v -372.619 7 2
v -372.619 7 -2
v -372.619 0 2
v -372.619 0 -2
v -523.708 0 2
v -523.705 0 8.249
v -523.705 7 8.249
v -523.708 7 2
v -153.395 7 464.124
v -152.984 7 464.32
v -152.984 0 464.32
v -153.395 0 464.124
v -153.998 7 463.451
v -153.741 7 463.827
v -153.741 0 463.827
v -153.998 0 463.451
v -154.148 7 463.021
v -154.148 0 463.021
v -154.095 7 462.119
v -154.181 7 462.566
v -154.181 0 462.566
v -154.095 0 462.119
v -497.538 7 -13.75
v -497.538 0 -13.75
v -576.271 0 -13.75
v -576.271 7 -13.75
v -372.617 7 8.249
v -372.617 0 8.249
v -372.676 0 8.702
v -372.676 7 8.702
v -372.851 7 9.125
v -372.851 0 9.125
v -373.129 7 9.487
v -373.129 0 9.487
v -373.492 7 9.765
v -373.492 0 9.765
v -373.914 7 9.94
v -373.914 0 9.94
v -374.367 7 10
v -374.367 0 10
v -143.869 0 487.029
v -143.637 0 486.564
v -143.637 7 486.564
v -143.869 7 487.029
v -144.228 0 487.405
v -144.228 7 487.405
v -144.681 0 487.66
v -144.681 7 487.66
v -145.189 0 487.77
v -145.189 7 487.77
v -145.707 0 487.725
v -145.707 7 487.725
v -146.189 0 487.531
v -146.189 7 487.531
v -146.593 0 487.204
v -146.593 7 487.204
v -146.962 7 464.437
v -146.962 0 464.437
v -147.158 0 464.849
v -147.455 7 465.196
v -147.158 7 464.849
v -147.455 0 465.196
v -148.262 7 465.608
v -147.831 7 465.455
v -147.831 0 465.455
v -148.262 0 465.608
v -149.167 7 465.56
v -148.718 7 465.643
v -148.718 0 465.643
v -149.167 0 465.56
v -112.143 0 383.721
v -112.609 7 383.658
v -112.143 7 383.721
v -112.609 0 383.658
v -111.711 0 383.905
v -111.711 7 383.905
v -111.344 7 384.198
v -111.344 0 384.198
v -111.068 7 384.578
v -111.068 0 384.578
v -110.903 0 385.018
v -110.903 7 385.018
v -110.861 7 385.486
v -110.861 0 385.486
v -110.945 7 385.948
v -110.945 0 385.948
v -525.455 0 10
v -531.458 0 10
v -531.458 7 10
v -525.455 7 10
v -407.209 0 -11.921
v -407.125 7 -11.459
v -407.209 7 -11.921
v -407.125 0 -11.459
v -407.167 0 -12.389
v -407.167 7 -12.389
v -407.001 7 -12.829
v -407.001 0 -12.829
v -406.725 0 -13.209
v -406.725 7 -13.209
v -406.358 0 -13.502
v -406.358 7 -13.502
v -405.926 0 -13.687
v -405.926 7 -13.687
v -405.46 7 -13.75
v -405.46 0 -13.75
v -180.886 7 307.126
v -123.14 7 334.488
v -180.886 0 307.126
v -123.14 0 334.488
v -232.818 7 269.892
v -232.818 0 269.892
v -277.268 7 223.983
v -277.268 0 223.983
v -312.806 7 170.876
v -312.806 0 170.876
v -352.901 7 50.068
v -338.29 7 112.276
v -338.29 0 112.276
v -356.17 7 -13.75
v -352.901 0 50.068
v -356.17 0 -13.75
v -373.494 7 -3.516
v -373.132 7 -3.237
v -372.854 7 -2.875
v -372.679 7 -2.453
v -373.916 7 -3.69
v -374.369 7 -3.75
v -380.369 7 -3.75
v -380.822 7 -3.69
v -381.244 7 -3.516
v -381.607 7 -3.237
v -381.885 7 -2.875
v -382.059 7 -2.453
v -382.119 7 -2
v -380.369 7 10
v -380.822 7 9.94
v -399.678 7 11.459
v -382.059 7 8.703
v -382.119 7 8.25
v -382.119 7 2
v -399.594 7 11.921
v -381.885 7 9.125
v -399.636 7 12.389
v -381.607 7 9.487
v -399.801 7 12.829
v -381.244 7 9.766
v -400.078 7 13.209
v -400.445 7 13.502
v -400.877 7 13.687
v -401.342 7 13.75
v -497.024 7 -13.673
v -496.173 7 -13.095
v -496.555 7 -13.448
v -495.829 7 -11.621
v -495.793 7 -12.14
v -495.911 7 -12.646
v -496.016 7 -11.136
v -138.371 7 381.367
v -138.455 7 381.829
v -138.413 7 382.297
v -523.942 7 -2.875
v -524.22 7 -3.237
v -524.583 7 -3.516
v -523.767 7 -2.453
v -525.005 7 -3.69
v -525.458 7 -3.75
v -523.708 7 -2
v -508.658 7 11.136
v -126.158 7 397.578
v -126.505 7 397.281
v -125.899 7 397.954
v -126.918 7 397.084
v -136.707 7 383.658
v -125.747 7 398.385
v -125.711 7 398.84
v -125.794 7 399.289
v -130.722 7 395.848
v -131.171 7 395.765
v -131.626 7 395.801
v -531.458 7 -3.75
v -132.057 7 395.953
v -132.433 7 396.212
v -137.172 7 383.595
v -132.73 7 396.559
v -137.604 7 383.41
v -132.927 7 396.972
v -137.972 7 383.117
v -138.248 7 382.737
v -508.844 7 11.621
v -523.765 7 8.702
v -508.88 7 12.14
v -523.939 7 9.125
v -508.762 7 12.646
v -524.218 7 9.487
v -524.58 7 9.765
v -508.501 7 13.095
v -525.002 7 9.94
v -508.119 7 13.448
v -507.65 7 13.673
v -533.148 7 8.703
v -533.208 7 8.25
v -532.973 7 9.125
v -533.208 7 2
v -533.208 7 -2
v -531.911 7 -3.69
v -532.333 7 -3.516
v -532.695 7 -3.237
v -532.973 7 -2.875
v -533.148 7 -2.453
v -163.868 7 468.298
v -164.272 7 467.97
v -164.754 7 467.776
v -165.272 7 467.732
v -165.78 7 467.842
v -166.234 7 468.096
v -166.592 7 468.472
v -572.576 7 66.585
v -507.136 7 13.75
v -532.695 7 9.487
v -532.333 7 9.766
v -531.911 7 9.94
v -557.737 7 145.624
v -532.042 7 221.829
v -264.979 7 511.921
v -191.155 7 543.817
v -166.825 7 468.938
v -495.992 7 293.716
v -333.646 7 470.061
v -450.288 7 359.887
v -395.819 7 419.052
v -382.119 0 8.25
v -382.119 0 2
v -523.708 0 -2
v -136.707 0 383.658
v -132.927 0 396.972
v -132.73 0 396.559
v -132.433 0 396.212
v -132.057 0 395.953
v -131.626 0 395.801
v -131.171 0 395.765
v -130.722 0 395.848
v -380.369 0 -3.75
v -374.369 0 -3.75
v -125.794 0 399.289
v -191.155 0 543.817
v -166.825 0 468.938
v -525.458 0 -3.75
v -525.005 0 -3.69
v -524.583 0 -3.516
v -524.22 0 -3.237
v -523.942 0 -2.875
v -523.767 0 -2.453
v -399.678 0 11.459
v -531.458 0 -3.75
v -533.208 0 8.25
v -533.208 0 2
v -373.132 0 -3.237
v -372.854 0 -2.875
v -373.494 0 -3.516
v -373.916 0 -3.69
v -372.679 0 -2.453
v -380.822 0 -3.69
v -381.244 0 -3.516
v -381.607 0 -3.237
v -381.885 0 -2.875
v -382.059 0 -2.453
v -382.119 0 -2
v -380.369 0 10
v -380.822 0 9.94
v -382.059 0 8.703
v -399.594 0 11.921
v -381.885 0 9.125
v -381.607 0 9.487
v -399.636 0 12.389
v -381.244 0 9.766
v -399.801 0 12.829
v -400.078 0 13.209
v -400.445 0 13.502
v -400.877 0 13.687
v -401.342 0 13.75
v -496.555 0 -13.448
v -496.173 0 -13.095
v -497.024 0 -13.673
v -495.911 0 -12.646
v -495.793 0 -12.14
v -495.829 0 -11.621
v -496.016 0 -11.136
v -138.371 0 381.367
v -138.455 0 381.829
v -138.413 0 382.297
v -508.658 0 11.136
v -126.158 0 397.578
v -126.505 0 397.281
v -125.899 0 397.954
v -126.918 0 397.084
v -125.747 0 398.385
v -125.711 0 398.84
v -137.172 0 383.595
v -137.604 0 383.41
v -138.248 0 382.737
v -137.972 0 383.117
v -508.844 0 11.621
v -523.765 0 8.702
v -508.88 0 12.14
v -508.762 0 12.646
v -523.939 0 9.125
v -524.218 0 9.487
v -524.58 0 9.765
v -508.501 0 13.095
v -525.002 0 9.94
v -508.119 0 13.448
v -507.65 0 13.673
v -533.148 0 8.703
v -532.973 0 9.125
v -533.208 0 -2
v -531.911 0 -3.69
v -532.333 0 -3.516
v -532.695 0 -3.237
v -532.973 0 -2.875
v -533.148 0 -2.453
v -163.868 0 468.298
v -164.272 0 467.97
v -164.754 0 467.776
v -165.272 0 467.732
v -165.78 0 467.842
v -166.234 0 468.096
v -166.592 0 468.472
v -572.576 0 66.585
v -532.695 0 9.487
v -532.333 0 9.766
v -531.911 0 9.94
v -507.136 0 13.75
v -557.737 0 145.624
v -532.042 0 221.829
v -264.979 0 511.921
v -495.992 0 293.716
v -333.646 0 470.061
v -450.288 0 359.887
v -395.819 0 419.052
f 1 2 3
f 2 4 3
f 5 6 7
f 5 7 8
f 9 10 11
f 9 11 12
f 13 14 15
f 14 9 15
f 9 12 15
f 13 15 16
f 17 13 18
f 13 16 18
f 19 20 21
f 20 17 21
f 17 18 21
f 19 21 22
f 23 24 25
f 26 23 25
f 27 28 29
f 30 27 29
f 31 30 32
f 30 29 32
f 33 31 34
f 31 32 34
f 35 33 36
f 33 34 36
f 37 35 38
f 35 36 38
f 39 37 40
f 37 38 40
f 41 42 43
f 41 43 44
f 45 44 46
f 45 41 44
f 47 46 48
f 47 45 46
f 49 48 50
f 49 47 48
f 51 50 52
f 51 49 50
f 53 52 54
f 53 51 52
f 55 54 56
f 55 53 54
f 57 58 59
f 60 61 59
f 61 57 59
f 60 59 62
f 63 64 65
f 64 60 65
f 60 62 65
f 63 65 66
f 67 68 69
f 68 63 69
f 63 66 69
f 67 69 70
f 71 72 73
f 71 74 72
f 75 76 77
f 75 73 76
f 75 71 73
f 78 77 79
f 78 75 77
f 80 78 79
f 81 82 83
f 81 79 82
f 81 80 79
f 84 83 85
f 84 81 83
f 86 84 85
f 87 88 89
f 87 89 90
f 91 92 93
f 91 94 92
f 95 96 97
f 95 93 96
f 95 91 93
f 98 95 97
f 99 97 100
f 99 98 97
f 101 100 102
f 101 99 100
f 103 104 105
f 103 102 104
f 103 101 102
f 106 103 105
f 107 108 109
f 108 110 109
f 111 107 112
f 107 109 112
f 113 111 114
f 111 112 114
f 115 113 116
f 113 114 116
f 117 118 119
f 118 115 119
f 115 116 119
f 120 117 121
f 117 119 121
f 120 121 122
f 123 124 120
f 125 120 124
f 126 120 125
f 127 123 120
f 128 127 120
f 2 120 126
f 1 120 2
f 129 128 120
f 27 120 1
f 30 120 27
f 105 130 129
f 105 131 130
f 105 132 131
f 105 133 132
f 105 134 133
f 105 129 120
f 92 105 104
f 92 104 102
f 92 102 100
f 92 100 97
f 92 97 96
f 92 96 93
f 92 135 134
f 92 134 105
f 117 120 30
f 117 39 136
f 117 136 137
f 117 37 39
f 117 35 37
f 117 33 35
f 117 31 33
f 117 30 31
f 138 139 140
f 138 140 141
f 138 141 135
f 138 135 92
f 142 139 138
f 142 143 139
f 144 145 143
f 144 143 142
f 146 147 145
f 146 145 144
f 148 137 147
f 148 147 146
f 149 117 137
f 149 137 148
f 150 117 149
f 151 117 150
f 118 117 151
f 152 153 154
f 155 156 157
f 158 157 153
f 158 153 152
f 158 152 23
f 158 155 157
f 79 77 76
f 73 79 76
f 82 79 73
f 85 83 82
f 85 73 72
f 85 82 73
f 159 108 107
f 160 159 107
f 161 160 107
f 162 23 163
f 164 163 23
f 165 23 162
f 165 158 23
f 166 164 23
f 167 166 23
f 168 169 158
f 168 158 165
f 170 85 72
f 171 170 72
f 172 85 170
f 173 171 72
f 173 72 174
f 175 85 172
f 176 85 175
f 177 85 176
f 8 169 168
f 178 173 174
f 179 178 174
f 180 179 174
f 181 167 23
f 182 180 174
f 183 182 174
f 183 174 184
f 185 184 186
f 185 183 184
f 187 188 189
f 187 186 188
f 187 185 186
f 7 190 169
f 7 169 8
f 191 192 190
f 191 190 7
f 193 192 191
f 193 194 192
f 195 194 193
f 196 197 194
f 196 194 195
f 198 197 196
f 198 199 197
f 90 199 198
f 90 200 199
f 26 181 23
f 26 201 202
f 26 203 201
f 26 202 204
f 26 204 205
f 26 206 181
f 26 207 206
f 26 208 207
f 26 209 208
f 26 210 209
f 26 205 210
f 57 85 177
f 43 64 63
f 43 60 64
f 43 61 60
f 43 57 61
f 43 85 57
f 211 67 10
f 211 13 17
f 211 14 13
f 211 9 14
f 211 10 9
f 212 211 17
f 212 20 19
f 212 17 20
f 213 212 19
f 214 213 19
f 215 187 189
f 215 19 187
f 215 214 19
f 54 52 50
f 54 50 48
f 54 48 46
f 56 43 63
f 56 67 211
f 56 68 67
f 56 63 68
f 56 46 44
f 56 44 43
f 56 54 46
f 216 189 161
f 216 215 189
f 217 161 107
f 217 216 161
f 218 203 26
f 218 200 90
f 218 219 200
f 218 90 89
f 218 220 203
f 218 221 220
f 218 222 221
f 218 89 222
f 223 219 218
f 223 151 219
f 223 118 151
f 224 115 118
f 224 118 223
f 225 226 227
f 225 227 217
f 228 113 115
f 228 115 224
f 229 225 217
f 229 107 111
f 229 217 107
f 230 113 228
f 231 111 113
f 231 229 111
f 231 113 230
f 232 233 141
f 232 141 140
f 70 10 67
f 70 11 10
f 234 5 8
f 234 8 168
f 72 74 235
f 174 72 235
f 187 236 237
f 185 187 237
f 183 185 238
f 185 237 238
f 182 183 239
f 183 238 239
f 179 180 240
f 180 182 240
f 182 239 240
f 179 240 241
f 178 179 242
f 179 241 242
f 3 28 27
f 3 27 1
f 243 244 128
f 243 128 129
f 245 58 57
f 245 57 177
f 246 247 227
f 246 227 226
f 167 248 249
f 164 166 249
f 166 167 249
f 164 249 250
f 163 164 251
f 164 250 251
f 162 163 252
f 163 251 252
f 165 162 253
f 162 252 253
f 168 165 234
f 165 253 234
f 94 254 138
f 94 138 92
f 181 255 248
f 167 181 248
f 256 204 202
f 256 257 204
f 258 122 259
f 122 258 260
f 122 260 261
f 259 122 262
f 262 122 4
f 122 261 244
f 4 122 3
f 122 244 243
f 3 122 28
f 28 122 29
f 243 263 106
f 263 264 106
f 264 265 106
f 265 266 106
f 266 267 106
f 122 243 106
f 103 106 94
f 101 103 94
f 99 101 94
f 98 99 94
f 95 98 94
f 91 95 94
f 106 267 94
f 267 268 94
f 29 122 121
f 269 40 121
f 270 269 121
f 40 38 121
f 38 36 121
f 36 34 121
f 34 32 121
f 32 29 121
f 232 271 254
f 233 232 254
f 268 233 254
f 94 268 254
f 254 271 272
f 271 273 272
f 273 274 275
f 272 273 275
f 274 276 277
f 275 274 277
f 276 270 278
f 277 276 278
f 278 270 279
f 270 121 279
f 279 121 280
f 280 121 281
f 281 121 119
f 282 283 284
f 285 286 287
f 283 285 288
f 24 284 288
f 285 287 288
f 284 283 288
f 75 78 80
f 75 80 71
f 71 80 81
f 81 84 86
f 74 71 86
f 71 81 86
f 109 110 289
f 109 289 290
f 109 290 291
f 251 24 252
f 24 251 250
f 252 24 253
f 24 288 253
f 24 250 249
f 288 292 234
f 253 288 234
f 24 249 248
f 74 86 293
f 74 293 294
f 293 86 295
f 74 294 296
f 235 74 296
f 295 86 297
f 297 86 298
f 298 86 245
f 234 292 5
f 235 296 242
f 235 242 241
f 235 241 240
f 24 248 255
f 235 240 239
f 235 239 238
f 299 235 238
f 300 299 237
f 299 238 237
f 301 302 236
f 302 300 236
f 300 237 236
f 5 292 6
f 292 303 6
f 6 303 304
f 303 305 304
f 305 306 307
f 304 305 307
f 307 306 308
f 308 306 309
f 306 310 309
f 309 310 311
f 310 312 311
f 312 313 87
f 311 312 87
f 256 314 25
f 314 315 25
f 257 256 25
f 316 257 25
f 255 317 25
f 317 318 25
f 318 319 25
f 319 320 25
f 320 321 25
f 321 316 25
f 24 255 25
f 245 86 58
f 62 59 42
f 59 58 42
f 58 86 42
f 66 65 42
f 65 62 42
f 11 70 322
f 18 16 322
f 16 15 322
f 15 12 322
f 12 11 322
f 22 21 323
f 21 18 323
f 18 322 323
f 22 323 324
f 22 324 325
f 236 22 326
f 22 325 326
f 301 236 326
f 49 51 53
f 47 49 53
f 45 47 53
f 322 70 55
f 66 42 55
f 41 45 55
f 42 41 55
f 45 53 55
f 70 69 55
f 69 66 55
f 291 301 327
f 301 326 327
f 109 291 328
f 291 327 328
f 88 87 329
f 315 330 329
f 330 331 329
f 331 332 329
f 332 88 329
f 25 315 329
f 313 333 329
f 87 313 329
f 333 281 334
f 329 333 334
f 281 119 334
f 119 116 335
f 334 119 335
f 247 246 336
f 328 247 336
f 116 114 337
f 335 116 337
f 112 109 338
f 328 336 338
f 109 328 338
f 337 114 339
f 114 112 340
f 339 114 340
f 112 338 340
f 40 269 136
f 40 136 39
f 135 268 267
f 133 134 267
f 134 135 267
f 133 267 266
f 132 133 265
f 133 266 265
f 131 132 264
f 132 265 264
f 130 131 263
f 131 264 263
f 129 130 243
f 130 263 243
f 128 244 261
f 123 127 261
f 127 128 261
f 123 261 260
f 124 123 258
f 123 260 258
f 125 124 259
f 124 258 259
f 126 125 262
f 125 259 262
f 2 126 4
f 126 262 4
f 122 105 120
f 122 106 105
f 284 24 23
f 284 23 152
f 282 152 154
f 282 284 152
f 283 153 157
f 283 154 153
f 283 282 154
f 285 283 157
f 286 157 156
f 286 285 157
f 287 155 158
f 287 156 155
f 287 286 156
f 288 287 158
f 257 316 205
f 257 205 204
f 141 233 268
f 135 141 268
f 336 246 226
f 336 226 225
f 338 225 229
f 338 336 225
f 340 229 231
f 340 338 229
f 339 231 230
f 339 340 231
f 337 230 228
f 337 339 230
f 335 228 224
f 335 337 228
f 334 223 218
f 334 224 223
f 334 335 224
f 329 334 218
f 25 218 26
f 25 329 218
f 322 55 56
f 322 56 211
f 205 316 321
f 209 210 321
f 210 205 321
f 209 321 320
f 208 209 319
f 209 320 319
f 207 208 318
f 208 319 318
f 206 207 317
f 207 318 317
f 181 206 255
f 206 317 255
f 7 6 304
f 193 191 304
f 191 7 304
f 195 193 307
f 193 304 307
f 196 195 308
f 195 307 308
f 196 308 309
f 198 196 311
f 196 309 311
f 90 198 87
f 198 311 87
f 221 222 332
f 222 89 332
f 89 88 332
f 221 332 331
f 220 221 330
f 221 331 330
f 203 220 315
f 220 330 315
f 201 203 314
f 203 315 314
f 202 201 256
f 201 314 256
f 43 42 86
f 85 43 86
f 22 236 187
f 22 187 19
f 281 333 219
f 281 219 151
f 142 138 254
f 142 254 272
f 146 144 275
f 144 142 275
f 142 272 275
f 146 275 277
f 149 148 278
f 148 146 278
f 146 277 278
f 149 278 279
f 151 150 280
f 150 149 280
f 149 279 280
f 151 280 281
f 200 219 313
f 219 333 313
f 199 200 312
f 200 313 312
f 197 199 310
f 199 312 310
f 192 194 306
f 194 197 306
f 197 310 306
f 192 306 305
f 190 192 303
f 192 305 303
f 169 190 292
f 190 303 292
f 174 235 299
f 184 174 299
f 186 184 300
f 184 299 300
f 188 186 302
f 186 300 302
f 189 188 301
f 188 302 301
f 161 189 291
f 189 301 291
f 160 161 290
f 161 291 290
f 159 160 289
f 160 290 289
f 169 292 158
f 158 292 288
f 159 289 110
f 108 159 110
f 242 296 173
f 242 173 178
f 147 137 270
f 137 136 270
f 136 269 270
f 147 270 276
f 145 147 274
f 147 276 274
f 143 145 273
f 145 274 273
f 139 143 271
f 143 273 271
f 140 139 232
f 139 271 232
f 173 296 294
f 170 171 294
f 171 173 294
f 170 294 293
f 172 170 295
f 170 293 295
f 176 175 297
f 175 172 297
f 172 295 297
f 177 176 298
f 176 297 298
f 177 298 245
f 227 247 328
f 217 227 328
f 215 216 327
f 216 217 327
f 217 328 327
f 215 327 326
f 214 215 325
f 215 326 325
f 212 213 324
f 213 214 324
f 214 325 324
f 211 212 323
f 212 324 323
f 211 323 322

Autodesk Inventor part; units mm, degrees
ref_plane "YZ Plane" through (0, 0, 0) normal (1, 0, 0) x (0, 1, 0)
ref_plane "XZ Plane" through (0, 0, 0) normal (0, 1, 0) x (-1, 0, 0)
ref_plane "XY Plane" through (0, 0, 0) normal (0, 0, 1) x (1, 0, 0)
sketch "Sketch1" plane through (0, 0, 0) normal (0, 1, 0) x (-1, 0, 0)
  line L0 (-545.8153, 185.3726) -> (-326.5965, 142.7608)
  line L1 (-545.8153, -185.3726) -> (-326.5965, -142.7608)
  arc A0 (-545.8153, -185.3726) -> (-545.8153, 185.3726) centre (0, 0) ccw
  arc A1 (374.3691, 3.75) -> (372.6191, 2) centre (374.3691, 2) ccw
  arc A2 (372.6191, -2) -> (374.3691, -3.75) centre (374.3691, -2) ccw
  line L2 (380.3691, 3.75) -> (374.3691, 3.75)
  line L3 (374.3691, -3.75) -> (380.3691, -3.75)
  line L4 (382.1191, 2) -> (382.1191, -2)
  arc A3 (380.3691, -3.75) -> (382.1191, -2) centre (380.3691, -2) ccw
  arc A4 (382.1191, 2) -> (380.3691, 3.75) centre (380.3691, 2) ccw
  line L5 (372.6191, -2) -> (372.6191, 2)
  line L6 (523.7076, 2) -> (523.7076, -2)
  arc A5 (523.7076, -2) -> (525.4576, -3.75) centre (525.4576, -2) ccw
  arc A6 (525.4576, 3.75) -> (523.7076, 2) centre (525.4576, 2) ccw
  line L7 (531.4576, -3.75) -> (525.4576, -3.75)
  line L8 (525.4576, 3.75) -> (531.4576, 3.75)
  arc A7 (531.4576, -3.75) -> (533.2076, -2) centre (531.4576, -2) ccw
  line L9 (533.2076, -2) -> (533.2076, 2)
  arc A8 (533.2076, 2) -> (531.4576, 3.75) centre (531.4576, 2) ccw
  arc A9 (-326.5965, -142.7608) -> (-326.5965, 142.7608) centre (0, 0) ccw
  line L10 (116.1792, 364.0349) -> (119.9834, 362.7989)
  arc A10 (121.107, 360.5937) -> (119.9834, 362.7989) centre (119.4426, 361.1345) ccw
  arc A11 (116.1792, 364.0349) -> (113.9741, 362.9114) centre (115.6384, 362.3706) ccw
  line L11 (119.2529, 354.8874) -> (121.107, 360.5937)
  line L12 (113.9741, 362.9114) -> (112.12, 357.205)
  line L13 (117.0478, 353.7638) -> (113.2435, 354.9999)
  arc A12 (112.12, 357.205) -> (113.2435, 354.9999) centre (113.7843, 356.6642) ccw
  arc A13 (117.0478, 353.7638) -> (119.2529, 354.8874) centre (117.5885, 355.4282) ccw
  arc A14 (163.7367, 497.4575) -> (165.9418, 498.5811) centre (164.2774, 499.1218) ccw
  arc A15 (158.8089, 500.8987) -> (159.9324, 498.6936) centre (160.4732, 500.3579) ccw
  line L14 (159.9324, 498.6936) -> (163.7367, 497.4575)
  line L15 (158.8089, 500.8987) -> (160.663, 506.605)
  line L16 (167.7959, 504.2874) -> (165.9418, 498.5811)
  arc A16 (162.8681, 507.7286) -> (160.663, 506.605) centre (162.3273, 506.0642) ccw
  line L17 (166.6723, 506.4925) -> (162.8681, 507.7286)
  arc A17 (167.7959, 504.2874) -> (166.6723, 506.4925) centre (166.1315, 504.8282) ccw
  line L18 (-310.3164, 222.986) -> (-307.9653, 226.222)
  arc A18 (-305.5209, 226.6092) -> (-307.9653, 226.222) centre (-306.5495, 225.1934) ccw
  arc A19 (-310.3164, 222.986) -> (-309.9293, 220.5416) centre (-308.9007, 221.9573) ccw
  line L19 (-300.6668, 223.0825) -> (-305.5209, 226.6092)
  line L20 (-309.9293, 220.5416) -> (-305.0752, 217.0148)
  line L21 (-300.2796, 220.6381) -> (-302.6308, 217.402)
  arc A20 (-305.0752, 217.0148) -> (-302.6308, 217.402) centre (-304.0466, 218.4306) ccw
  arc A21 (-300.2796, 220.6381) -> (-300.6668, 223.0825) centre (-301.6954, 221.6667) ccw
  arc A22 (-422.5128, 309.4456) -> (-422.8999, 311.89) centre (-423.9286, 310.4743) ccw
  arc A23 (-427.3083, 305.8224) -> (-424.8639, 306.2096) centre (-426.2797, 307.2382) ccw
  line L22 (-424.8639, 306.2096) -> (-422.5128, 309.4456)
  line L23 (-427.3083, 305.8224) -> (-432.1624, 309.3491)
  line L24 (-427.754, 315.4167) -> (-422.8999, 311.89)
  arc A24 (-432.5496, 311.7935) -> (-432.1624, 309.3491) centre (-431.1338, 310.7649) ccw
  line L25 (-430.1984, 315.0296) -> (-432.5496, 311.7935)
  arc A25 (-427.754, 315.4167) -> (-430.1984, 315.0296) centre (-428.7827, 314.001) ccw
  line L26 (-307.9653, -226.222) -> (-310.3164, -222.986)
  arc A26 (-309.9293, -220.5416) -> (-310.3164, -222.986) centre (-308.9007, -221.9573) ccw
  arc A27 (-307.9653, -226.222) -> (-305.5209, -226.6092) centre (-306.5495, -225.1934) ccw
  line L27 (-305.0752, -217.0148) -> (-309.9293, -220.5416)
  line L28 (-305.5209, -226.6092) -> (-300.6668, -223.0825)
  line L29 (-302.6308, -217.402) -> (-300.2796, -220.6381)
  arc A28 (-300.6668, -223.0825) -> (-300.2796, -220.6381) centre (-301.6954, -221.6667) ccw
  arc A29 (-302.6308, -217.402) -> (-305.0752, -217.0148) centre (-304.0466, -218.4306) ccw
  arc A30 (-424.8639, -306.2096) -> (-427.3083, -305.8224) centre (-426.2797, -307.2382) ccw
  arc A31 (-422.8999, -311.89) -> (-422.5128, -309.4456) centre (-423.9286, -310.4743) ccw
  line L30 (-422.5128, -309.4456) -> (-424.8639, -306.2096)
  line L31 (-422.8999, -311.89) -> (-427.754, -315.4167)
  line L32 (-432.1624, -309.3491) -> (-427.3083, -305.8224)
  arc A32 (-430.1984, -315.0296) -> (-427.754, -315.4167) centre (-428.7827, -314.001) ccw
  line L33 (-432.5496, -311.7935) -> (-430.1984, -315.0296)
  arc A33 (-432.1624, -309.3491) -> (-432.5496, -311.7935) centre (-431.1338, -310.7649) ccw
  line L34 (119.9834, -362.7989) -> (116.1792, -364.0349)
  arc A34 (113.9741, -362.9114) -> (116.1792, -364.0349) centre (115.6384, -362.3706) ccw
  arc A35 (119.9834, -362.7989) -> (121.107, -360.5937) centre (119.4426, -361.1345) ccw
  line L35 (112.12, -357.205) -> (113.9741, -362.9114)
  line L36 (121.107, -360.5937) -> (119.2529, -354.8874)
  line L37 (113.2435, -354.9999) -> (117.0478, -353.7638)
  arc A36 (119.2529, -354.8874) -> (117.0478, -353.7638) centre (117.5885, -355.4282) ccw
  arc A37 (113.2435, -354.9999) -> (112.12, -357.205) centre (113.7843, -356.6642) ccw
  arc A38 (159.9324, -498.6936) -> (158.8089, -500.8987) centre (160.4732, -500.3579) ccw
  arc A39 (165.9418, -498.5811) -> (163.7367, -497.4575) centre (164.2774, -499.1218) ccw
  line L38 (163.7367, -497.4575) -> (159.9324, -498.6936)
  line L39 (165.9418, -498.5811) -> (167.7959, -504.2874)
  line L40 (160.663, -506.605) -> (158.8089, -500.8987)
  arc A40 (166.6723, -506.4925) -> (167.7959, -504.2874) centre (166.1315, -504.8282) ccw
  line L41 (162.8681, -507.7286) -> (166.6723, -506.4925)
  arc A41 (160.663, -506.605) -> (162.8681, -507.7286) centre (162.3273, -506.0642) ccw
  line L42 (225.4462, 74.1184) -> (211.8442, 74.1184)
  line L43 (225.4462, 74.1184) -> (225.4462, 49.1184)
  arc A42 (405.4604, -13.75) -> (407.1248, -11.4592) centre (405.4604, -12) ccw
  arc A43 (496.0158, -11.1361) -> (497.5378, -13.75) centre (497.5378, -12) ccw
  line L44 (508.6578, 11.1361) -> (496.0158, -11.1361)
  arc A44 (508.6578, 11.1361) -> (507.1359, 13.75) centre (507.1359, 12) ccw
  arc A45 (416.8691, -2) -> (418.6191, -3.75) centre (418.6191, -2) ccw
  line L45 (399.6781, 11.4592) -> (407.1248, -11.4592)
  line L46 (416.8691, 2) -> (416.8691, -2)
  arc A46 (401.3425, 13.75) -> (399.6781, 11.4592) centre (401.3425, 12) ccw
  arc A47 (418.6191, 3.75) -> (416.8691, 2) centre (418.6191, 2) ccw
  line L47 (507.1359, 13.75) -> (401.3425, 13.75)
  line L48 (418.6191, -3.75) -> (487.1191, -3.75)
  line L49 (487.1191, 3.75) -> (418.6191, 3.75)
  arc A48 (487.1191, -3.75) -> (488.8691, -2.0136) centre (487.1326, -2.0136) ccw
  line L50 (488.8691, -2.0136) -> (488.8691, 2)
  arc A49 (488.8691, 2) -> (487.1191, 3.75) centre (487.1191, 2) ccw
  line L51 (405.4604, -13.75) -> (356.1697, -13.75)
  line L52 (497.5378, -13.75) -> (576.271, -13.75)
  arc A50 (163.8684, 468.2978) -> (166.8247, 468.9375) centre (165.1603, 469.4783) ccw
  line L53 (146.5928, 487.2036) -> (163.8684, 468.2978)
  arc A51 (146.5928, 487.2036) -> (143.6366, 486.5639) centre (145.3009, 486.0231) ccw
  line L54 (152.9839, 464.32) -> (149.1668, 465.5602)
  arc A52 (154.0946, 462.119) -> (152.9839, 464.32) centre (152.4473, 462.6685) ccw
  arc A53 (149.1668, 465.5602) -> (146.9616, 464.4366) centre (148.626, 463.8959) ccw
  arc A54 (110.9446, 385.9484) -> (112.609, 383.6576) centre (112.609, 385.4076) ccw
  arc A55 (138.3712, 381.3668) -> (136.7068, 383.6576) centre (136.7068, 381.9076) ccw
  line L55 (112.609, 383.6576) -> (136.7068, 383.6576)
  line L56 (126.9175, 397.0841) -> (130.7218, 395.8481)
  arc A56 (125.794, 399.2893) -> (126.9175, 397.0841) centre (127.4583, 398.7485) ccw
  line L57 (143.6366, 486.5639) -> (110.9446, 385.9484)
  line L58 (146.9616, 464.4366) -> (125.794, 399.2893)
  line L59 (132.9269, 396.9716) -> (154.0946, 462.119)
  arc A57 (130.7218, 395.8481) -> (132.9269, 396.9716) centre (131.2625, 397.5124) ccw
  line L60 (138.3712, 381.3668) -> (123.1395, 334.4885)
  line L61 (166.8247, 468.9375) -> (191.1546, 543.8173)
  line L62 (-394.3199, 288.9791) -> (-396.679, 285.732)
  arc A58 (-391.8835, 289.3553) -> (-394.3199, 288.9791) centre (-392.915, 287.9584) ccw
  arc A59 (-396.679, 285.732) -> (-396.2919, 283.2876) centre (-395.2632, 284.7034) ccw
  line L63 (-338.4298, 243.4115) -> (-336.0786, 246.6476)
  arc A60 (-340.8742, 243.0243) -> (-338.4298, 243.4115) centre (-339.8456, 244.4401) ccw
  line L64 (-396.2919, 283.2876) -> (-340.8742, 243.0243)
  line L65 (-336.4658, 249.092) -> (-391.8835, 289.3553)
  arc A61 (-336.0786, 246.6476) -> (-336.4658, 249.092) centre (-337.4944, 247.6762) ccw
  line L66 (-396.687, -285.7211) -> (-394.3279, -288.9681)
  arc A62 (-396.2919, -283.2876) -> (-396.687, -285.7211) centre (-395.2821, -284.7004) ccw
  arc A63 (-394.3279, -288.9681) -> (-391.8835, -289.3553) centre (-392.9121, -287.9395) ccw
  line L67 (-336.0786, -246.6476) -> (-338.4298, -243.4115)
  arc A64 (-336.4658, -249.092) -> (-336.0786, -246.6476) centre (-337.4944, -247.6762) ccw
  line L68 (-391.8835, -289.3553) -> (-336.4658, -249.092)
  line L69 (-340.8742, -243.0243) -> (-396.2919, -283.2876)
  arc A65 (-338.4298, -243.4115) -> (-340.8742, -243.0243) centre (-339.8456, -244.4401) ccw
  arc A66 (142.6862, -475.1804) -> (140.6706, -477.4355) centre (142.3349, -476.8947) ccw
  line L70 (167.775, -480.3211) -> (142.6862, -475.1804)
  arc A67 (167.775, -480.3211) -> (169.7906, -478.0659) centre (168.1263, -478.6067) ccw
  line L71 (149.1539, -465.5644) -> (152.971, -464.3241)
  arc A68 (146.9616, -464.4366) -> (149.1539, -465.5644) centre (148.6173, -463.9129) ccw
  arc A69 (152.971, -464.3241) -> (154.0946, -462.119) centre (152.4302, -462.6598) ccw
  arc A70 (137.0987, -377.4504) -> (134.4057, -376.5754) centre (135.4343, -377.9912) ccw
  arc A71 (112.2171, -389.8648) -> (114.9101, -390.7398) centre (113.8815, -389.324) ccw
  line L72 (134.4057, -376.5754) -> (114.9101, -390.7398)
  line L73 (130.7218, -395.8481) -> (126.9175, -397.0841)
  arc A72 (132.9269, -396.9716) -> (130.7218, -395.8481) centre (131.2625, -397.5124) ccw
  line L74 (169.7906, -478.0659) -> (137.0987, -377.4504)
  line L75 (154.0946, -462.119) -> (132.9269, -396.9716)
  line L76 (125.794, -399.2893) -> (146.9616, -464.4366)
  arc A73 (126.9175, -397.0841) -> (125.794, -399.2893) centre (127.4583, -398.7485) ccw
  line L77 (112.2171, -389.8648) -> (96.9855, -342.9865)
  line L78 (140.6706, -477.4355) -> (165.0005, -552.3153)
  line L79 (-432.5496, 311.7935) -> (-436.2232, 306.7372)
  line L80 (-435.8361, 304.2928) -> (-430.9801, 300.7647)
  line L81 (-428.5353, 301.1524) -> (-424.8639, 306.2096)
  arc A74 (-436.2232, 306.7372) -> (-435.8361, 304.2928) centre (-434.8075, 305.7085) ccw
  arc A75 (-430.9801, 300.7647) -> (-428.5353, 301.1524) centre (-429.9515, 302.1805) ccw
  line L82 (-310.3164, 222.986) -> (-313.9901, 217.9296)
  line L83 (-313.603, 215.4852) -> (-308.7469, 211.9571)
  line L84 (-306.3022, 212.3448) -> (-302.6308, 217.402)
  arc A76 (-313.9901, 217.9296) -> (-313.603, 215.4852) centre (-312.5743, 216.901) ccw
  arc A77 (-308.7469, 211.9571) -> (-306.3022, 212.3448) centre (-307.7183, 213.3729) ccw
  line L85 (-430.1984, -315.0296) -> (-426.5248, -320.086)
  arc A78 (-426.5248, -320.086) -> (-424.0804, -320.4731) centre (-425.109, -319.0573) ccw
  line L86 (-424.0804, -320.4731) -> (-419.2244, -316.945)
  arc A79 (-419.2244, -316.945) -> (-418.8376, -314.5001) centre (-420.253, -315.5292) ccw
  line L87 (-418.8376, -314.5001) -> (-422.5128, -309.4456)
  line L88 (-307.9653, -226.222) -> (-304.2917, -231.2784)
  arc A80 (-304.2917, -231.2784) -> (-301.8472, -231.6655) centre (-302.8759, -230.2498) ccw
  line L89 (-301.8472, -231.6655) -> (-296.9912, -228.1374)
  line L90 (-296.6045, -225.6925) -> (-300.2796, -220.6381)
  arc A81 (-296.9912, -228.1374) -> (-296.6045, -225.6925) centre (-298.0199, -226.7217) ccw
  line L91 (166.6723, -506.4925) -> (172.6164, -504.5612)
  arc A82 (172.6164, -504.5612) -> (173.74, -502.356) centre (172.0756, -502.8968) ccw
  line L92 (173.74, -502.356) -> (171.8852, -496.6475)
  arc A83 (171.8852, -496.6475) -> (169.6794, -495.5241) centre (170.2208, -497.1882) ccw
  line L93 (169.6794, -495.5241) -> (163.7367, -497.4575)
  line L94 (119.9834, -362.7989) -> (125.9275, -360.8675)
  arc A84 (125.9275, -360.8675) -> (127.0511, -358.6624) centre (125.3867, -359.2032) ccw
  line L95 (127.0511, -358.6624) -> (125.1963, -352.9538)
  line L96 (122.9905, -351.8304) -> (117.0478, -353.7638)
  arc A85 (125.1963, -352.9538) -> (122.9905, -351.8304) centre (123.5319, -353.4946) ccw
  line L97 (533.2076, 2) -> (533.2076, 8.25)
  arc A86 (533.2076, 8.25) -> (531.4576, 10) centre (531.4576, 8.25) ccw
  line L98 (531.4576, 10) -> (525.4552, 10)
  arc A87 (525.4552, 10) -> (523.7052, 8.2493) centre (525.4552, 8.25) ccw
  line L99 (523.7052, 8.2493) -> (523.7076, 2)
  line L100 (382.1191, 2) -> (382.1191, 8.25)
  arc A88 (382.1191, 8.25) -> (380.3691, 10) centre (380.3691, 8.25) ccw
  line L101 (380.3691, 10) -> (374.3668, 10)
  line L102 (372.6168, 8.2493) -> (372.6191, 2)
  arc A89 (374.3668, 10) -> (372.6168, 8.2493) centre (374.3668, 8.25) ccw
  line L103 (162.8681, 507.7286) -> (156.924, 509.6599)
  arc A90 (156.924, 509.6599) -> (154.7189, 508.5364) centre (156.3832, 507.9956) ccw
  line L104 (154.7189, 508.5364) -> (152.864, 502.8278)
  arc A91 (152.864, 502.8278) -> (153.9882, 500.6225) centre (154.5284, 502.287) ccw
  line L105 (153.9882, 500.6225) -> (159.9324, 498.6936)
  line L106 (116.1792, 364.0349) -> (110.2351, 365.9663)
  arc A92 (110.2351, 365.9663) -> (108.03, 364.8427) centre (109.6943, 364.3019) ccw
  line L107 (108.03, 364.8427) -> (106.1751, 359.1341)
  line L108 (107.2993, 356.9288) -> (113.2435, 354.9999)
  arc A93 (106.1751, 359.1341) -> (107.2993, 356.9288) centre (107.8395, 358.5934) ccw
  point P0 (494.5322, -13.75)
  point P1 (417.3817, -3.2374)
  point P2 (417.3817, 3.2374)
  point P3 (488.3566, 3.2374)
  point P4 (165.8959, 466.0791)
  point P5 (147.8315, 465.4551)
  point P6 (125.8991, 397.954)
  point P7 (132.057, 395.9532)
  point P8 (-396.9917, 284.4297)
  point P9 (-339.5718, 242.7117)
  point P10 (-335.766, 247.95)
  point P11 (-393.1859, -289.6679)
  point P12 (-335.766, -247.95)
  point P13 (-339.5718, -242.7117)
  point P14 (139.7418, -474.577)
  point P15 (153.9895, -463.4543)
  point P16 (132.057, -395.9532)
  point P17 (125.8991, -397.954)
  point P18 (-302.6308, 217.402)
  point P19 (113.2435, 354.9999)
  point P20 (372.6191, 2)
  dimension "d34" = 1152.87
  dimension "d45" = 7.5
  dimension "d48" = 712.87
  dimension "d60" = 360
  dimension "d62" = 13.602
  dimension "d63" = 25
  dimension "d72" = 7.5
  dimension "d74" = 3.5
  dimension "d75" = 3.5
  dimension "d79" = 0
  dimension "d80" = 8
  dimension "d81" = 1.75
  dimension "d84" = 8
  dimension "d85" = 1.75
  dimension "d88" = 360
extrude "Extrusion1" add sketch "Sketch1" along normal blind 7 contours A0 L52 A43 L44 A44 L47 A46 L45 A42 L51 A9 L60 A55 L55 A54 L57 A51 L53 A50 L61
properties part number "Level 2b - V2"
